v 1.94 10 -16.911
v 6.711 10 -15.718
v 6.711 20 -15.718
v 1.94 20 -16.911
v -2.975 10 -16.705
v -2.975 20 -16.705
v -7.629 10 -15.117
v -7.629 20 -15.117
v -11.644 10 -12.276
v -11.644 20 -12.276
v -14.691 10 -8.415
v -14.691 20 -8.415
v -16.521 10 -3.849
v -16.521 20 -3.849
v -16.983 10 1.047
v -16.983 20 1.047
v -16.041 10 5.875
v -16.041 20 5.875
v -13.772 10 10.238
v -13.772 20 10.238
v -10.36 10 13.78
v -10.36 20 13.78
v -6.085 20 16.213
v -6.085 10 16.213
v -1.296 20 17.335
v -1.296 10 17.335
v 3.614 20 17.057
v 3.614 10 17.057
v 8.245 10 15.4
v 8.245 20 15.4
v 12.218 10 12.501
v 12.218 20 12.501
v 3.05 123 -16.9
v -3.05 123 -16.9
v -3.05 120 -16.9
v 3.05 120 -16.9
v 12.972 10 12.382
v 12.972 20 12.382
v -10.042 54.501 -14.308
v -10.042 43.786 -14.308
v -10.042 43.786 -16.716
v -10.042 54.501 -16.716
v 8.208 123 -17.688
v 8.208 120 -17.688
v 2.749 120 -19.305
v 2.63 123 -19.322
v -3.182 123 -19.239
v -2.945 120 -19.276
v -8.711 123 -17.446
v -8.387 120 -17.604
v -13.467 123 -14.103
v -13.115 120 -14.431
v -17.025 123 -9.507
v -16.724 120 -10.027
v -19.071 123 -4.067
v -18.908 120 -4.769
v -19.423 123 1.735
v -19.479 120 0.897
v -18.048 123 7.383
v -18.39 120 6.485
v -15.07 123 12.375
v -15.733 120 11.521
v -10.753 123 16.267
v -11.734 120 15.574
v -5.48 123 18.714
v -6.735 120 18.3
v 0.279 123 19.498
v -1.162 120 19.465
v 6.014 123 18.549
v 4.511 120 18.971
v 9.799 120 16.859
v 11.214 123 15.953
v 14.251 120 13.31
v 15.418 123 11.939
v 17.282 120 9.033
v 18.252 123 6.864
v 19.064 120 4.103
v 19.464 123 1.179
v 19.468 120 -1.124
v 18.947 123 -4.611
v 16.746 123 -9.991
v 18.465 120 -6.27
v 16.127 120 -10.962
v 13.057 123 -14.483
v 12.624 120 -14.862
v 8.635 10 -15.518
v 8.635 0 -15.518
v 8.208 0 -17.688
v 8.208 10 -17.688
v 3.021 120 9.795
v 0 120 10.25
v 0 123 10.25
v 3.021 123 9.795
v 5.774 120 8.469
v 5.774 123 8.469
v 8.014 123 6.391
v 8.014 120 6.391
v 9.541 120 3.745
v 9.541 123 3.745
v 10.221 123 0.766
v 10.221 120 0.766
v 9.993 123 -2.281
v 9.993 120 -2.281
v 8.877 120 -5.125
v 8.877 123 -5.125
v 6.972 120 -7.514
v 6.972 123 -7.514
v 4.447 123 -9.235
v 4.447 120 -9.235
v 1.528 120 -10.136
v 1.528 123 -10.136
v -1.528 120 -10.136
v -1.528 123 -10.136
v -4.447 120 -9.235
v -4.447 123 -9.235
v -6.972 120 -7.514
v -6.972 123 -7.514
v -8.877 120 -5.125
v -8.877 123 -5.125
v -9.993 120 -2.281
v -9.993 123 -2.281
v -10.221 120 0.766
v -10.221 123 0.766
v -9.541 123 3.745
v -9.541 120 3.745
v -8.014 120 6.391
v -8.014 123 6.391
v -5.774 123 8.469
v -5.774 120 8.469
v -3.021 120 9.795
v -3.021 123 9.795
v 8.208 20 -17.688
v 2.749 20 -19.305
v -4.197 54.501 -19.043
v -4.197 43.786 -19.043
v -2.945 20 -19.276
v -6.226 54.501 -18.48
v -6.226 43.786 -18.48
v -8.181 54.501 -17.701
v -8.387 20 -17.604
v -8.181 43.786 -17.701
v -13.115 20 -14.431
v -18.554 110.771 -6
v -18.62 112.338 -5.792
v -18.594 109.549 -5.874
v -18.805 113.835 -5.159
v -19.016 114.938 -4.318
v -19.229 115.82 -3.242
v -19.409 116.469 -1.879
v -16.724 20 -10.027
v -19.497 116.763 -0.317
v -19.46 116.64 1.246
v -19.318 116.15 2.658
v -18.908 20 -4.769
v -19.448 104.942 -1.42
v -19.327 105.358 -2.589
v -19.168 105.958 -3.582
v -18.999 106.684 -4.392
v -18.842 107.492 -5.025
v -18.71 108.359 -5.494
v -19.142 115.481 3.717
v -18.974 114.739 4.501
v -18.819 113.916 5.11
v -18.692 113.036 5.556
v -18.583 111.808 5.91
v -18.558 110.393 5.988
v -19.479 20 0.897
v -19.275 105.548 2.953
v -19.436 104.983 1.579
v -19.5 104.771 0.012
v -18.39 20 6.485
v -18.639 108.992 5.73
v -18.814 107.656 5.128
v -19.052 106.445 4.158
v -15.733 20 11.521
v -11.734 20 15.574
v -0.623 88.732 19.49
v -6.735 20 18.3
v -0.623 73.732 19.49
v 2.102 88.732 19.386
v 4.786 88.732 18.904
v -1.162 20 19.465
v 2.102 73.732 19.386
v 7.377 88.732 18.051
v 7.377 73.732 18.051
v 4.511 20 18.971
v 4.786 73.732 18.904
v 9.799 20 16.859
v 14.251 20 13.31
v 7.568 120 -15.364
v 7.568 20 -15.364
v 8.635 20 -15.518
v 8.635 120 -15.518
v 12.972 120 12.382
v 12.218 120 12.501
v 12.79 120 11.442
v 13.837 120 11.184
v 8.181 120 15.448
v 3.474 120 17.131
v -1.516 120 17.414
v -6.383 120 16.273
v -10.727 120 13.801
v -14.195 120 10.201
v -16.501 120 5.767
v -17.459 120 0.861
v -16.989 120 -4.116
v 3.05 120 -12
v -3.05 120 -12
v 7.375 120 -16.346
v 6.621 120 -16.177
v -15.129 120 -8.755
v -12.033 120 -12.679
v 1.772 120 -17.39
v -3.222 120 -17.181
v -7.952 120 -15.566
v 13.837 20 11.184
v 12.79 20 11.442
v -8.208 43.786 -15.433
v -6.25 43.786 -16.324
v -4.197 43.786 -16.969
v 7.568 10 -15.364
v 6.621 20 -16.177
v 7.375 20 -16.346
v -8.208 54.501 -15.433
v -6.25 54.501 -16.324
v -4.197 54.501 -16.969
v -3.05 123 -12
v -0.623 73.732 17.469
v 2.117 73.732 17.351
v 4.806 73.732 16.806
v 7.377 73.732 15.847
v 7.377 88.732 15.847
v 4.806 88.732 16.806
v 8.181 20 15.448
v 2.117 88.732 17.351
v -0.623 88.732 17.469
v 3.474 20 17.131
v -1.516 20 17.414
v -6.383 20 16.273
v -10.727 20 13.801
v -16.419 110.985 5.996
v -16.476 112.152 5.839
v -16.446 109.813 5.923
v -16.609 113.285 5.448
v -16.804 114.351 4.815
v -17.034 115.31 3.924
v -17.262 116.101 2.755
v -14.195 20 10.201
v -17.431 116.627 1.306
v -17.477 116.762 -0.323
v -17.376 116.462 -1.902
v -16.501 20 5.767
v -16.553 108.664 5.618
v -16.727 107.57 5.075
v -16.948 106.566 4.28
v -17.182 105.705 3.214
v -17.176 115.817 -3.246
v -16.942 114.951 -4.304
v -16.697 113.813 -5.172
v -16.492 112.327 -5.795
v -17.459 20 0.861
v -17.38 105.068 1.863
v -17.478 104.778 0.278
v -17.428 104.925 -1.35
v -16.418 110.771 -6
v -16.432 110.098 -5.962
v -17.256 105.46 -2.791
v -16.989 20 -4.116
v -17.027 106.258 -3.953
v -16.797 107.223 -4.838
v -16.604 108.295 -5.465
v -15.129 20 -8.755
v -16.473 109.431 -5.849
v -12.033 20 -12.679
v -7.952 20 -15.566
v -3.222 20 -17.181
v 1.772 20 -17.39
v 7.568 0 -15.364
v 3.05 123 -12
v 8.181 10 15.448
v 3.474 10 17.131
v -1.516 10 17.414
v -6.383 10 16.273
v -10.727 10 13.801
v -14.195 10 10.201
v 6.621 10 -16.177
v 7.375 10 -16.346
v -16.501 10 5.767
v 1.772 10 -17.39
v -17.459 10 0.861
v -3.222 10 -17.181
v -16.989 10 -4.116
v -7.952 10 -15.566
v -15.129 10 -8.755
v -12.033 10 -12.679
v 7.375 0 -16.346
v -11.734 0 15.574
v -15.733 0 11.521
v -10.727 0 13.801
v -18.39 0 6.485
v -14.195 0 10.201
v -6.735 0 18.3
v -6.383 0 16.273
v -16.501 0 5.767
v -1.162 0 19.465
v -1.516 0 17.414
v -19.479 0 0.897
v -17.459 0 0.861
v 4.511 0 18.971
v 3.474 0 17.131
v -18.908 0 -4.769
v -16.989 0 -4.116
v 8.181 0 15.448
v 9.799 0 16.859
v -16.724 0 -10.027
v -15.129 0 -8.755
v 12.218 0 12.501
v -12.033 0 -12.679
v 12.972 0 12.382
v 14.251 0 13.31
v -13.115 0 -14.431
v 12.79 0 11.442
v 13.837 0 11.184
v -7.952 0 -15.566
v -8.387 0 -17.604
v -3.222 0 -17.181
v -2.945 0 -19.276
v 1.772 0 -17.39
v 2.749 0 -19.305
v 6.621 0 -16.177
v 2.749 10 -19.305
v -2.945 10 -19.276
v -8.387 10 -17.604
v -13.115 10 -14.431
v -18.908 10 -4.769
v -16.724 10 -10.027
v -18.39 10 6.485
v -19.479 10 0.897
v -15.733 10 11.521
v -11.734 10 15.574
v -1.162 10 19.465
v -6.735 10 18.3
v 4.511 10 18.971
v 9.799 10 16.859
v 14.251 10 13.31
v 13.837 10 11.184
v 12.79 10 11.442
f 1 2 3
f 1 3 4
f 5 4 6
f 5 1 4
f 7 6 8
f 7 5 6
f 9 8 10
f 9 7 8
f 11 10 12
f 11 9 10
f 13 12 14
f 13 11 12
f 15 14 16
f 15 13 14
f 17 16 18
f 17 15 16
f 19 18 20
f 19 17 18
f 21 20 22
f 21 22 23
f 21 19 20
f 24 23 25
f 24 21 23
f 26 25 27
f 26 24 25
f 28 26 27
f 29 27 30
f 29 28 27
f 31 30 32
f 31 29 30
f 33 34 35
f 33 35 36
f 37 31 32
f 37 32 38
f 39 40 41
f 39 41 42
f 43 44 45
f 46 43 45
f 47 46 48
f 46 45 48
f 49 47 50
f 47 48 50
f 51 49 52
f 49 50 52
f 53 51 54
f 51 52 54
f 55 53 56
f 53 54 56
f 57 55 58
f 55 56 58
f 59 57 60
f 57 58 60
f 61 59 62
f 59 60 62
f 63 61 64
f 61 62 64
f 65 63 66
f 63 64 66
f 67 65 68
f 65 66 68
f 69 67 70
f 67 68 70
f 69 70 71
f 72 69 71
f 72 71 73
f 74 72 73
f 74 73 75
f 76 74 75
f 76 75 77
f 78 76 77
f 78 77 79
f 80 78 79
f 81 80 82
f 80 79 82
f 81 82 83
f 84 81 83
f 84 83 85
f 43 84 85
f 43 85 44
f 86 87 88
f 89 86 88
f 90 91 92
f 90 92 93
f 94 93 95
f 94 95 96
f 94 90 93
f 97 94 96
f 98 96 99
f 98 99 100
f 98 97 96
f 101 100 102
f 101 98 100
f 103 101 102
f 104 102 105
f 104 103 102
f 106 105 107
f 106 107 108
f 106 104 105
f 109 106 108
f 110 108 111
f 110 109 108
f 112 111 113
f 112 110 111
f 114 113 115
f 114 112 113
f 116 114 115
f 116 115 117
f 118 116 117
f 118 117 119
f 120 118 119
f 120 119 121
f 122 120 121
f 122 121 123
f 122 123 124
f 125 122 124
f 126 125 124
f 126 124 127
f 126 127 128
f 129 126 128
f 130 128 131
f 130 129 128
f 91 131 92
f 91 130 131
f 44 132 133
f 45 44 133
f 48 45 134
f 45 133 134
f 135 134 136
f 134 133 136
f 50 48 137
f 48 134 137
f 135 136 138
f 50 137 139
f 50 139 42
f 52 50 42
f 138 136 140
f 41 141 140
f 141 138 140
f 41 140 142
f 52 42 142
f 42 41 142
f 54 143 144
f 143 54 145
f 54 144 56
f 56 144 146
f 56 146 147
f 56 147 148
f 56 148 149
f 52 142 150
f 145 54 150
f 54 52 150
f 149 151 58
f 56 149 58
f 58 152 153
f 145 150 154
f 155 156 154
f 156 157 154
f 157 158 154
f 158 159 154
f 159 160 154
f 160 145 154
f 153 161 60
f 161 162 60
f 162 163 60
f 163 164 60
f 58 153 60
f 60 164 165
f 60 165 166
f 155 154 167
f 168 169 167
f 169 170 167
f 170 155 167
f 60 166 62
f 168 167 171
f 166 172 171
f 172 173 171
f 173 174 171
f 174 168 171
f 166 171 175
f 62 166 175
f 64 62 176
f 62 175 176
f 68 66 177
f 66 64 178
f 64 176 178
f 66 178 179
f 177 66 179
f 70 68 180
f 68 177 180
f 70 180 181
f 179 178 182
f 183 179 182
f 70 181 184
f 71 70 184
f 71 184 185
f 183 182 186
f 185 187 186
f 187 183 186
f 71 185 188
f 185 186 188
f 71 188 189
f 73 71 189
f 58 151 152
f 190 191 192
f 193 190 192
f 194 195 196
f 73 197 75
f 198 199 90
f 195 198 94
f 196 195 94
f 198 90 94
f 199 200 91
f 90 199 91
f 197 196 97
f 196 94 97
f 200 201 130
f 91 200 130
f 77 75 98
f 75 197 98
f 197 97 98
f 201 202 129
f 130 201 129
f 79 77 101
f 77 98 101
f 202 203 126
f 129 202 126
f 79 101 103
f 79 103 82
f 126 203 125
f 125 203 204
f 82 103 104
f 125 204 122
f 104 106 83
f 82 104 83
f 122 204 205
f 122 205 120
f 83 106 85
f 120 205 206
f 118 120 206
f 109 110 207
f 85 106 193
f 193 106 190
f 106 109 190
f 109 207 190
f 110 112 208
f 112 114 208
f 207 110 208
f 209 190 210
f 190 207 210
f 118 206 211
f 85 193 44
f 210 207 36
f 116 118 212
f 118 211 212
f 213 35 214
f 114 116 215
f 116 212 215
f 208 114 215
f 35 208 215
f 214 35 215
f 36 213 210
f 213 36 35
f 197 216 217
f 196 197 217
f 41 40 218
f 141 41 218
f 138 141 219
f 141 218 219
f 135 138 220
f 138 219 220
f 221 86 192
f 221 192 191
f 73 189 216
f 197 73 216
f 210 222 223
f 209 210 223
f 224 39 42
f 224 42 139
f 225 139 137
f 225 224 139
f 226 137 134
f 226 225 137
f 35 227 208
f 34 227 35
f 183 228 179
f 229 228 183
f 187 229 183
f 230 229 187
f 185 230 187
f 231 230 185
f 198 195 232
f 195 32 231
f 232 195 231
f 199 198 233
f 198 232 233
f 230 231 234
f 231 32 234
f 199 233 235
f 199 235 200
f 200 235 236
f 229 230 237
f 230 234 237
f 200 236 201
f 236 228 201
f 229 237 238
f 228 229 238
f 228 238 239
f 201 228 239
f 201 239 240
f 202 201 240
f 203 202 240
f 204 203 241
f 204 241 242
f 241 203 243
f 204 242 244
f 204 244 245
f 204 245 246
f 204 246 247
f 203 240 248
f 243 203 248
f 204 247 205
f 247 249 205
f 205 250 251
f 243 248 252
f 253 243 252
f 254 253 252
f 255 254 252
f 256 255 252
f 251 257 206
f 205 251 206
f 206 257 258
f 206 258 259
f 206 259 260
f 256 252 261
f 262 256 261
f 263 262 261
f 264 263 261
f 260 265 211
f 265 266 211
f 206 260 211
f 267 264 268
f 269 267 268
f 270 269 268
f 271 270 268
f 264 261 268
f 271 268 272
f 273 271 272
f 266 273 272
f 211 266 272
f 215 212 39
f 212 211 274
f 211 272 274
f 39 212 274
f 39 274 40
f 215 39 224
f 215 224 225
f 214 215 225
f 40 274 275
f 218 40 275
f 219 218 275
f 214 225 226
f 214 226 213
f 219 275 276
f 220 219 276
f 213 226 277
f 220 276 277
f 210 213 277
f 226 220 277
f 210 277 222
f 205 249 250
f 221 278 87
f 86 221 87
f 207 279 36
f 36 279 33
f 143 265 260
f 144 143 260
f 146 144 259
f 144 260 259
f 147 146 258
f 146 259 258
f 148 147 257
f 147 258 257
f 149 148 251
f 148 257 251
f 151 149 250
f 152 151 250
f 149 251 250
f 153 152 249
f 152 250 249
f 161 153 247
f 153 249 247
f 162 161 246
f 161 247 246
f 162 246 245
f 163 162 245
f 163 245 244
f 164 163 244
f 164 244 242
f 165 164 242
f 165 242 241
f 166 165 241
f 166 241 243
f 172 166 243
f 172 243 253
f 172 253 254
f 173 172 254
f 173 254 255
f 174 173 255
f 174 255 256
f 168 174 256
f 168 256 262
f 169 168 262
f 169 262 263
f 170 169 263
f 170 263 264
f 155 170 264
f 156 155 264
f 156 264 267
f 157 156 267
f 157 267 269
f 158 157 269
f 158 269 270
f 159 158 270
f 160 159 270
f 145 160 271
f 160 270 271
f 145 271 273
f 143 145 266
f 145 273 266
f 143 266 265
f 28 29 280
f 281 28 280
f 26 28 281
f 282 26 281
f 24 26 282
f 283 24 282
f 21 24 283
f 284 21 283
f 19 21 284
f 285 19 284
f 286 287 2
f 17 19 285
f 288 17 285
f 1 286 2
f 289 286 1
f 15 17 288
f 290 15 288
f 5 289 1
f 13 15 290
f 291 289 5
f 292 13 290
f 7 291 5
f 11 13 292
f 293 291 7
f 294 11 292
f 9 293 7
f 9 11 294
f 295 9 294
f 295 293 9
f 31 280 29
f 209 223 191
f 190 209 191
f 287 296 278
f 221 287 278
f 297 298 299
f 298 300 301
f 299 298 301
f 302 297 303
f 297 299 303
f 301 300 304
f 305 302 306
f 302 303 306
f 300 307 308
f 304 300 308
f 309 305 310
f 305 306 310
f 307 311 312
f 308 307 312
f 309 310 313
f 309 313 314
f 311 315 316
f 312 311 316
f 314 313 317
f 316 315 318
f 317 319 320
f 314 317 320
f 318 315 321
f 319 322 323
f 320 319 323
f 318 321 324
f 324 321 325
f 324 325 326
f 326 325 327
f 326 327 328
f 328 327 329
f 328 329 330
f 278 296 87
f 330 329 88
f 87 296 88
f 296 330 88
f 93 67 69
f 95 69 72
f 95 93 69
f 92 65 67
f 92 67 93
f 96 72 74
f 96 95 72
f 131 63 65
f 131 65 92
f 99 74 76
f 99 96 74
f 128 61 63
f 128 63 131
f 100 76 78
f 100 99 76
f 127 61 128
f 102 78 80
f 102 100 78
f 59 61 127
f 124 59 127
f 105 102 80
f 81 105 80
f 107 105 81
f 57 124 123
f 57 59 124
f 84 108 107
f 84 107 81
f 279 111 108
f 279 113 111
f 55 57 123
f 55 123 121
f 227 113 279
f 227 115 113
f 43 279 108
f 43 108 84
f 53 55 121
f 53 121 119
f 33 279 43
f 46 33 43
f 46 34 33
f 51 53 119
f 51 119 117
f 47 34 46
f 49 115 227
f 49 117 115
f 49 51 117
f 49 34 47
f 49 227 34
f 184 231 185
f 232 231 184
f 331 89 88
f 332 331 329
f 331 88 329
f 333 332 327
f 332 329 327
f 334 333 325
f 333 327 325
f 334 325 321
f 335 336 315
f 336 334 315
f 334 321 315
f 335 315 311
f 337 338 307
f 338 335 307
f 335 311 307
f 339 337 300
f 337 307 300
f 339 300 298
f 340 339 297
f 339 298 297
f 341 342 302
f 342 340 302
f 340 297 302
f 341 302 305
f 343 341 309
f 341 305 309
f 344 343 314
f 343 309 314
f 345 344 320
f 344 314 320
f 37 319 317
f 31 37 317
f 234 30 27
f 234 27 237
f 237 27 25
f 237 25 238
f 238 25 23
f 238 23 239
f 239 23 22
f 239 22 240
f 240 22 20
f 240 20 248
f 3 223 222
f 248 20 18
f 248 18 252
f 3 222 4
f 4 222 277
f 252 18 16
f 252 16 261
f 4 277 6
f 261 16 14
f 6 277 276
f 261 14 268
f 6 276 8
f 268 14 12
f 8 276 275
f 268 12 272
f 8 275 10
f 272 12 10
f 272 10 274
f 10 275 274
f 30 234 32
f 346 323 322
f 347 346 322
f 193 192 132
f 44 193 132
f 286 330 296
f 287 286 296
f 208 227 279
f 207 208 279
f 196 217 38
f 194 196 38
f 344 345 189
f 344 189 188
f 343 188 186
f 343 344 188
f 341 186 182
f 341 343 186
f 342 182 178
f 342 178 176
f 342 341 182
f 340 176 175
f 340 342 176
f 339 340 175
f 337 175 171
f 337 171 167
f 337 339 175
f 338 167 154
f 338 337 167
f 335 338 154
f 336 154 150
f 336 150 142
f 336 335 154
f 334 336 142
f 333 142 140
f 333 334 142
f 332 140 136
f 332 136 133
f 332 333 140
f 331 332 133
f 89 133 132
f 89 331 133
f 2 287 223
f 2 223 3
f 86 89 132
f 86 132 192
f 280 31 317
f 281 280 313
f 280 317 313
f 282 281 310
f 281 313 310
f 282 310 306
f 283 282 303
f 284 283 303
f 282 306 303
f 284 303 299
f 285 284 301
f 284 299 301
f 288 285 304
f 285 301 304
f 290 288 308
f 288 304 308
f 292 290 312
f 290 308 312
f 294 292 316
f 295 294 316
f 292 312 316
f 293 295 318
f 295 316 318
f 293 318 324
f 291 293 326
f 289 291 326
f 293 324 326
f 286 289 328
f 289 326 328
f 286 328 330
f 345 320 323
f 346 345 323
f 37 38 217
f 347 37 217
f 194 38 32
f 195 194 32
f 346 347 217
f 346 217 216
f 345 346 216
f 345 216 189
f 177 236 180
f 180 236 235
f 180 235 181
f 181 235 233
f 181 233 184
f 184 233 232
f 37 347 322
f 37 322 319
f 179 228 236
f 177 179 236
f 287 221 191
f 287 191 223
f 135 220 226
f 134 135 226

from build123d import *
from build123d.topology import SkipClean

# Parameters (mm, degrees)
BOSS_EXTRUDE1_DEPTH = 120
SKETCH13_R          = 19.5
SKETCH13_R_2        = 10.25
BOSS_EXTRUDE3_DEPTH = 3
SKETCH16_W          = 6.1
SKETCH16_H          = 4.9
CUT_EXTRUDE1_DEPTH  = 5
SKETCH17_W          = 8
SKETCH17_H          = 15
CUT_EXTRUDE2_DEPTH  = 150
SKETCH18_R          = 6
CUT_EXTRUDE5_DEPTH  = 20
SKETCH21_W          = 5.844351091
SKETCH21_H          = 10.714643668
CUT_EXTRUDE6_DEPTH  = 120
BOSS_EXTRUDE4_DEPTH = 10


with BuildPart() as part:
    # Sketch12 → Boss-Extrude1 (new body)
    with BuildSketch(Plane(origin=(0, 0, 0), x_dir=(1, 0, 0), z_dir=(0, 1, 0))):
        with BuildLine():
            Line((8.634693417, 15.51841097), (8.20840412, 17.688191027))
            ThreePointArc((8.20840412, 17.688191027), (-19.139762737, -3.730882249), (14.250877044, -13.310240549))
            Line((14.250877044, -13.310240549), (13.836638735, -11.183931196))
            Line((13.836638735, -11.183931196), (12.790172439, -11.44177067))
            Line((12.790172439, -11.44177067), (12.971781009, -12.381940525))
            Line((12.971781009, -12.381940525), (12.217996211, -12.500838715))
            ThreePointArc((12.217996211, -12.500838715), (-17.156357674, -3.348102652), (6.621374847, 16.1773853))
            Line((6.621374847, 16.1773853), (7.375159644, 16.345842711))
            Line((7.375159644, 16.345842711), (7.567993782, 15.364331637))
            Line((7.567993782, 15.364331637), (8.634693417, 15.51841097))
        make_face()
    extrude(amount=BOSS_EXTRUDE1_DEPTH)

    # Sketch13 → Boss-Extrude3 (add)
    with BuildSketch(Plane(origin=(0, 120, 0), x_dir=(1, 0, 0), z_dir=(0, 1, 0))):
        with Locations(Location((0, 0, 0), (0, 0, 65.10581206))):
            Circle(SKETCH13_R)
        with Locations(Location((0, 0, 0), (0, 0, 270))):
            Circle(SKETCH13_R_2, mode=Mode.SUBTRACT)
    extrude(amount=BOSS_EXTRUDE3_DEPTH)

    # Sketch16 → Cut-Extrude1 (cut)
    with BuildSketch(Plane(origin=(0, 123, 0), x_dir=(1, 0, 0), z_dir=(0, 1, 0))):
        with Locations((0, 14.45)):
            Rectangle(SKETCH16_W, SKETCH16_H)
    extrude(amount=-CUT_EXTRUDE1_DEPTH, mode=Mode.SUBTRACT)

    # Sketch17 → Cut-Extrude2 (cut)
    with BuildSketch(Plane.XY):
        with Locations((3.376565864, 81.232231727)):
            Rectangle(SKETCH17_W, SKETCH17_H)
    extrude(amount=CUT_EXTRUDE2_DEPTH, mode=Mode.SUBTRACT)

    # Sketch18 → Cut-Extrude5 (cut)
    with BuildSketch(Plane(origin=(0, 0, 0), x_dir=(0, 0, -1), z_dir=(1, 0, 0))):
        with Locations((0, 110.771126565)):
            Circle(SKETCH18_R)
    extrude(amount=-CUT_EXTRUDE5_DEPTH, mode=Mode.SUBTRACT)

    # Sketch21 → Cut-Extrude6 (cut)
    with BuildSketch(Plane.XY):
        with Locations((-7.11941315, 49.143528952)):
            Rectangle(SKETCH21_W, SKETCH21_H)
    extrude(amount=-CUT_EXTRUDE6_DEPTH, mode=Mode.SUBTRACT)

    # Sketch24 → Boss-Extrude4 (add)
    with SkipClean():  # the faces are left unmerged after this step: merging them gives an invalid solid
        with BuildSketch(Plane(origin=(0, 10, 0), x_dir=(-1, 0, 0), z_dir=(0, -1, 0))):
            with BuildLine():
                Line((-8.634693417, 15.51841097), (-7.567993782, 15.364331637))
                Line((-7.567993782, 15.364331637), (-7.375159644, 16.345842711))
                Line((-7.375159644, 16.345842711), (-6.711023244, 15.718008714))
                ThreePointArc((-6.711023244, 15.718008714), (16.685830266, -3.494713985), (-12.217996211, -12.500838715))
                Line((-12.217996211, -12.500838715), (-12.971781009, -12.381940525))
                Line((-12.971781009, -12.381940525), (-12.790172439, -11.44177067))
                Line((-12.790172439, -11.44177067), (-13.836638735, -11.183931196))
                Line((-13.836638735, -11.183931196), (-14.250877044, -13.310240549))
                ThreePointArc((-14.250877044, -13.310240549), (19.139762737, -3.730882249), (-8.20840412, 17.688191027))
                Line((-8.20840412, 17.688191027), (-8.634693417, 15.51841097))
            make_face()
        extrude(amount=-BOSS_EXTRUDE4_DEPTH)


solid = part.part
